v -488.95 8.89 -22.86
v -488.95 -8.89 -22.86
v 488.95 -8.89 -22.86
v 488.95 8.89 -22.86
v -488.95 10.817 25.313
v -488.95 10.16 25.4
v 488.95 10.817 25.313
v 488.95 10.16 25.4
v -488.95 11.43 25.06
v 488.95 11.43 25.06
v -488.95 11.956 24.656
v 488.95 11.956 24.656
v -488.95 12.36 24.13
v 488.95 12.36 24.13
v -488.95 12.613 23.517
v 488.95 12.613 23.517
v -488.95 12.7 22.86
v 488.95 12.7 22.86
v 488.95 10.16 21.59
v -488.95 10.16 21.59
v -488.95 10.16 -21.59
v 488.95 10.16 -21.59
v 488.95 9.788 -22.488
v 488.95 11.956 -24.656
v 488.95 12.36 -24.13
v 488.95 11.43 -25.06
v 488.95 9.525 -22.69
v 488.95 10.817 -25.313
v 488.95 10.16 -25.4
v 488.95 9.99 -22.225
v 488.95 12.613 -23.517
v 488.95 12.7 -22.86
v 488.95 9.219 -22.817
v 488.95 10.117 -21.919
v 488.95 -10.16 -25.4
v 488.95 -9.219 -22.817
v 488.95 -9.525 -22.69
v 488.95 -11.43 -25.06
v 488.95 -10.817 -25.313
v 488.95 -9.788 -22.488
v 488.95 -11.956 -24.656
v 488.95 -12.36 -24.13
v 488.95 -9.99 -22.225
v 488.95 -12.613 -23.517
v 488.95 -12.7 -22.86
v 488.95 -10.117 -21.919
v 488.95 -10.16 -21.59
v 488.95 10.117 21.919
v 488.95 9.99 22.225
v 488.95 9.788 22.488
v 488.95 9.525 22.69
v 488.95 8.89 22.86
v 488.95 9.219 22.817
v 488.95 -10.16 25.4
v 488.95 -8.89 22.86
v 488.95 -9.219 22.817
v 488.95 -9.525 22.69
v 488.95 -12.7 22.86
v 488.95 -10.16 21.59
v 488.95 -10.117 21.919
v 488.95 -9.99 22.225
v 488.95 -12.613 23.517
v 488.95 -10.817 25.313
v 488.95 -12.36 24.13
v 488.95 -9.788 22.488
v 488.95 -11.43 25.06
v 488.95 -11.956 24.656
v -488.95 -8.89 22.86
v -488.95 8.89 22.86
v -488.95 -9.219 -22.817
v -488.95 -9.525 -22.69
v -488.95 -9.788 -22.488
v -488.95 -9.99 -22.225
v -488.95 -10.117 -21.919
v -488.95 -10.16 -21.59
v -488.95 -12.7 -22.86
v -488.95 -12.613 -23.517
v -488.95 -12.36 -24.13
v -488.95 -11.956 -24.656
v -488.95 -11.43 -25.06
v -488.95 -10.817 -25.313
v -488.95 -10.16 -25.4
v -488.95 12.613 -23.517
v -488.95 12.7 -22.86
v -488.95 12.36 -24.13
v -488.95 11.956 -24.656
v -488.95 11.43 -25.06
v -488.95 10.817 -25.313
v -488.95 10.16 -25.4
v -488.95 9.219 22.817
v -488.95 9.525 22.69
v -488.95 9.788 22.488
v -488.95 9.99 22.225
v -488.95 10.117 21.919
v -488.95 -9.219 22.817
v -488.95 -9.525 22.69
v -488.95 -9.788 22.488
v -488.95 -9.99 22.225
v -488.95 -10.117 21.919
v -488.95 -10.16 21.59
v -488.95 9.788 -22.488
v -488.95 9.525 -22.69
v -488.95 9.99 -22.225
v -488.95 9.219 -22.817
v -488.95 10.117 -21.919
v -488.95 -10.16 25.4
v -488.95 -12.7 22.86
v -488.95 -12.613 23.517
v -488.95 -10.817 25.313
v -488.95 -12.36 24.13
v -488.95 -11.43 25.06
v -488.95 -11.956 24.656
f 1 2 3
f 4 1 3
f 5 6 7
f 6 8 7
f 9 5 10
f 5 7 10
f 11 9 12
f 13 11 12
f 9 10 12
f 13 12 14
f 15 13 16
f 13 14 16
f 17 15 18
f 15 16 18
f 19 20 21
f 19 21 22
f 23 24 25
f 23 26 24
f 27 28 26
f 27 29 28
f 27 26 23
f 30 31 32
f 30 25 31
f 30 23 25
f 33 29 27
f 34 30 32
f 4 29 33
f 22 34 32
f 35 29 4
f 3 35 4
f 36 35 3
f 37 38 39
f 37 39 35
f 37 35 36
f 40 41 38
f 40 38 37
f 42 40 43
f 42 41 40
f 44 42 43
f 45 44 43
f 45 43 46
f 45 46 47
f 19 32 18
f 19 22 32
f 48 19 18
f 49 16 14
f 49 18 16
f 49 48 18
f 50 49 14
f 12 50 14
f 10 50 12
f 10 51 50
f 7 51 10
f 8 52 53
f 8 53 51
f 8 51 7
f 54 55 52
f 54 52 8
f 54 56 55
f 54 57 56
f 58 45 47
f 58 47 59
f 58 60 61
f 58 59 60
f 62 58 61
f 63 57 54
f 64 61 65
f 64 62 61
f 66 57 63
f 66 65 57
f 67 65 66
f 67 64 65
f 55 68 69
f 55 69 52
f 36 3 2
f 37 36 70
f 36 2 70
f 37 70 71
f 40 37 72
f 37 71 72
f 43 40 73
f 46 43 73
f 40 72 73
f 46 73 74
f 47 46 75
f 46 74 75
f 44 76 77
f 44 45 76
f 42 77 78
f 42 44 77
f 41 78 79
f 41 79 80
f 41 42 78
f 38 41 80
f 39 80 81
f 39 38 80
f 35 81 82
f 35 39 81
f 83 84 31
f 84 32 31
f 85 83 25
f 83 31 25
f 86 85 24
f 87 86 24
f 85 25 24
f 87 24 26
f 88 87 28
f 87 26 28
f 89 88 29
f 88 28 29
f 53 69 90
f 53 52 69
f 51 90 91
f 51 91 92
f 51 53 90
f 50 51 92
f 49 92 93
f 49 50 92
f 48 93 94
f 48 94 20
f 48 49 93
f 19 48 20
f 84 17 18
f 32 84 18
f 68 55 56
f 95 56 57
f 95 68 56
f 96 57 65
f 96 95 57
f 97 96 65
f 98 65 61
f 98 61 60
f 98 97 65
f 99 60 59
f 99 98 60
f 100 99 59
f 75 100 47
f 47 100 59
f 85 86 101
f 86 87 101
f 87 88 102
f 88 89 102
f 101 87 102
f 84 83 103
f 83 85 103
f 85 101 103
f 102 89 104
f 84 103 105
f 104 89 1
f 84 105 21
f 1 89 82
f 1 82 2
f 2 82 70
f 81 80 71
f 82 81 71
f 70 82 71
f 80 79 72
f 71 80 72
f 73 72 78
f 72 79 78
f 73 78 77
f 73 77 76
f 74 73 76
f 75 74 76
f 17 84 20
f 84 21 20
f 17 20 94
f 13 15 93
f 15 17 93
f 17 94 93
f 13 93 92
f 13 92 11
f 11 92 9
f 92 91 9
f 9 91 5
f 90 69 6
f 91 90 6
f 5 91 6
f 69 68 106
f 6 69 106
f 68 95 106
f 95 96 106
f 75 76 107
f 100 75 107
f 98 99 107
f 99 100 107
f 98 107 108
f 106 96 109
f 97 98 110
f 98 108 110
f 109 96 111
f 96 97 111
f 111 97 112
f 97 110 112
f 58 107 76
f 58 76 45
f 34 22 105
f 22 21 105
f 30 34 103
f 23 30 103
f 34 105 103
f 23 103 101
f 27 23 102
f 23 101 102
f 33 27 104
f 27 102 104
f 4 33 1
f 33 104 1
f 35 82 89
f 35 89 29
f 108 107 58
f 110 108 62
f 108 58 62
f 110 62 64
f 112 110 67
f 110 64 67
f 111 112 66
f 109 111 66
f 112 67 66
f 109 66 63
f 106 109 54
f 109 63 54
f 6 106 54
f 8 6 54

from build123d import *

# Parameters (mm, degrees)
F0_W     = 977.9
F0_H     = 50.8
F1_DEPTH = 12.7
F2_T     = -2.54
F3_R     = 2.54
F4_R     = 1.27


with BuildPart() as f1:
    # F0 (on Front) → F1 (new body, symmetric)
    with BuildSketch(Plane.XZ):
        Rectangle(F0_W, F0_H)
    extrude(amount=F1_DEPTH, both=True)

    # F2
    f2_openings = [f1.faces().sort_by_distance(p)[0] for p in [
        (-488.95, 0, 0),
        (488.95, 0, 0),
    ]]
    offset(amount=F2_T, openings=f2_openings)

    # F3
    f3_edges = [f1.edges().sort_by_distance(p)[0] for p in [
        (0, -12.7, 25.4),
        (0, 12.7, 25.4),
        (0, 12.7, -25.4),
        (0, -12.7, -25.4),
    ]]
    fillet(f3_edges, radius=F3_R)

    # F4
    f4_edges = [f1.edges().sort_by_distance(p)[0] for p in [
        (0, -10.16, 22.86),
        (0, 10.16, 22.86),
        (0, 10.16, -22.86),
        (0, -10.16, -22.86),
    ]]
    fillet(f4_edges, radius=F4_R)


solid = f1.part
